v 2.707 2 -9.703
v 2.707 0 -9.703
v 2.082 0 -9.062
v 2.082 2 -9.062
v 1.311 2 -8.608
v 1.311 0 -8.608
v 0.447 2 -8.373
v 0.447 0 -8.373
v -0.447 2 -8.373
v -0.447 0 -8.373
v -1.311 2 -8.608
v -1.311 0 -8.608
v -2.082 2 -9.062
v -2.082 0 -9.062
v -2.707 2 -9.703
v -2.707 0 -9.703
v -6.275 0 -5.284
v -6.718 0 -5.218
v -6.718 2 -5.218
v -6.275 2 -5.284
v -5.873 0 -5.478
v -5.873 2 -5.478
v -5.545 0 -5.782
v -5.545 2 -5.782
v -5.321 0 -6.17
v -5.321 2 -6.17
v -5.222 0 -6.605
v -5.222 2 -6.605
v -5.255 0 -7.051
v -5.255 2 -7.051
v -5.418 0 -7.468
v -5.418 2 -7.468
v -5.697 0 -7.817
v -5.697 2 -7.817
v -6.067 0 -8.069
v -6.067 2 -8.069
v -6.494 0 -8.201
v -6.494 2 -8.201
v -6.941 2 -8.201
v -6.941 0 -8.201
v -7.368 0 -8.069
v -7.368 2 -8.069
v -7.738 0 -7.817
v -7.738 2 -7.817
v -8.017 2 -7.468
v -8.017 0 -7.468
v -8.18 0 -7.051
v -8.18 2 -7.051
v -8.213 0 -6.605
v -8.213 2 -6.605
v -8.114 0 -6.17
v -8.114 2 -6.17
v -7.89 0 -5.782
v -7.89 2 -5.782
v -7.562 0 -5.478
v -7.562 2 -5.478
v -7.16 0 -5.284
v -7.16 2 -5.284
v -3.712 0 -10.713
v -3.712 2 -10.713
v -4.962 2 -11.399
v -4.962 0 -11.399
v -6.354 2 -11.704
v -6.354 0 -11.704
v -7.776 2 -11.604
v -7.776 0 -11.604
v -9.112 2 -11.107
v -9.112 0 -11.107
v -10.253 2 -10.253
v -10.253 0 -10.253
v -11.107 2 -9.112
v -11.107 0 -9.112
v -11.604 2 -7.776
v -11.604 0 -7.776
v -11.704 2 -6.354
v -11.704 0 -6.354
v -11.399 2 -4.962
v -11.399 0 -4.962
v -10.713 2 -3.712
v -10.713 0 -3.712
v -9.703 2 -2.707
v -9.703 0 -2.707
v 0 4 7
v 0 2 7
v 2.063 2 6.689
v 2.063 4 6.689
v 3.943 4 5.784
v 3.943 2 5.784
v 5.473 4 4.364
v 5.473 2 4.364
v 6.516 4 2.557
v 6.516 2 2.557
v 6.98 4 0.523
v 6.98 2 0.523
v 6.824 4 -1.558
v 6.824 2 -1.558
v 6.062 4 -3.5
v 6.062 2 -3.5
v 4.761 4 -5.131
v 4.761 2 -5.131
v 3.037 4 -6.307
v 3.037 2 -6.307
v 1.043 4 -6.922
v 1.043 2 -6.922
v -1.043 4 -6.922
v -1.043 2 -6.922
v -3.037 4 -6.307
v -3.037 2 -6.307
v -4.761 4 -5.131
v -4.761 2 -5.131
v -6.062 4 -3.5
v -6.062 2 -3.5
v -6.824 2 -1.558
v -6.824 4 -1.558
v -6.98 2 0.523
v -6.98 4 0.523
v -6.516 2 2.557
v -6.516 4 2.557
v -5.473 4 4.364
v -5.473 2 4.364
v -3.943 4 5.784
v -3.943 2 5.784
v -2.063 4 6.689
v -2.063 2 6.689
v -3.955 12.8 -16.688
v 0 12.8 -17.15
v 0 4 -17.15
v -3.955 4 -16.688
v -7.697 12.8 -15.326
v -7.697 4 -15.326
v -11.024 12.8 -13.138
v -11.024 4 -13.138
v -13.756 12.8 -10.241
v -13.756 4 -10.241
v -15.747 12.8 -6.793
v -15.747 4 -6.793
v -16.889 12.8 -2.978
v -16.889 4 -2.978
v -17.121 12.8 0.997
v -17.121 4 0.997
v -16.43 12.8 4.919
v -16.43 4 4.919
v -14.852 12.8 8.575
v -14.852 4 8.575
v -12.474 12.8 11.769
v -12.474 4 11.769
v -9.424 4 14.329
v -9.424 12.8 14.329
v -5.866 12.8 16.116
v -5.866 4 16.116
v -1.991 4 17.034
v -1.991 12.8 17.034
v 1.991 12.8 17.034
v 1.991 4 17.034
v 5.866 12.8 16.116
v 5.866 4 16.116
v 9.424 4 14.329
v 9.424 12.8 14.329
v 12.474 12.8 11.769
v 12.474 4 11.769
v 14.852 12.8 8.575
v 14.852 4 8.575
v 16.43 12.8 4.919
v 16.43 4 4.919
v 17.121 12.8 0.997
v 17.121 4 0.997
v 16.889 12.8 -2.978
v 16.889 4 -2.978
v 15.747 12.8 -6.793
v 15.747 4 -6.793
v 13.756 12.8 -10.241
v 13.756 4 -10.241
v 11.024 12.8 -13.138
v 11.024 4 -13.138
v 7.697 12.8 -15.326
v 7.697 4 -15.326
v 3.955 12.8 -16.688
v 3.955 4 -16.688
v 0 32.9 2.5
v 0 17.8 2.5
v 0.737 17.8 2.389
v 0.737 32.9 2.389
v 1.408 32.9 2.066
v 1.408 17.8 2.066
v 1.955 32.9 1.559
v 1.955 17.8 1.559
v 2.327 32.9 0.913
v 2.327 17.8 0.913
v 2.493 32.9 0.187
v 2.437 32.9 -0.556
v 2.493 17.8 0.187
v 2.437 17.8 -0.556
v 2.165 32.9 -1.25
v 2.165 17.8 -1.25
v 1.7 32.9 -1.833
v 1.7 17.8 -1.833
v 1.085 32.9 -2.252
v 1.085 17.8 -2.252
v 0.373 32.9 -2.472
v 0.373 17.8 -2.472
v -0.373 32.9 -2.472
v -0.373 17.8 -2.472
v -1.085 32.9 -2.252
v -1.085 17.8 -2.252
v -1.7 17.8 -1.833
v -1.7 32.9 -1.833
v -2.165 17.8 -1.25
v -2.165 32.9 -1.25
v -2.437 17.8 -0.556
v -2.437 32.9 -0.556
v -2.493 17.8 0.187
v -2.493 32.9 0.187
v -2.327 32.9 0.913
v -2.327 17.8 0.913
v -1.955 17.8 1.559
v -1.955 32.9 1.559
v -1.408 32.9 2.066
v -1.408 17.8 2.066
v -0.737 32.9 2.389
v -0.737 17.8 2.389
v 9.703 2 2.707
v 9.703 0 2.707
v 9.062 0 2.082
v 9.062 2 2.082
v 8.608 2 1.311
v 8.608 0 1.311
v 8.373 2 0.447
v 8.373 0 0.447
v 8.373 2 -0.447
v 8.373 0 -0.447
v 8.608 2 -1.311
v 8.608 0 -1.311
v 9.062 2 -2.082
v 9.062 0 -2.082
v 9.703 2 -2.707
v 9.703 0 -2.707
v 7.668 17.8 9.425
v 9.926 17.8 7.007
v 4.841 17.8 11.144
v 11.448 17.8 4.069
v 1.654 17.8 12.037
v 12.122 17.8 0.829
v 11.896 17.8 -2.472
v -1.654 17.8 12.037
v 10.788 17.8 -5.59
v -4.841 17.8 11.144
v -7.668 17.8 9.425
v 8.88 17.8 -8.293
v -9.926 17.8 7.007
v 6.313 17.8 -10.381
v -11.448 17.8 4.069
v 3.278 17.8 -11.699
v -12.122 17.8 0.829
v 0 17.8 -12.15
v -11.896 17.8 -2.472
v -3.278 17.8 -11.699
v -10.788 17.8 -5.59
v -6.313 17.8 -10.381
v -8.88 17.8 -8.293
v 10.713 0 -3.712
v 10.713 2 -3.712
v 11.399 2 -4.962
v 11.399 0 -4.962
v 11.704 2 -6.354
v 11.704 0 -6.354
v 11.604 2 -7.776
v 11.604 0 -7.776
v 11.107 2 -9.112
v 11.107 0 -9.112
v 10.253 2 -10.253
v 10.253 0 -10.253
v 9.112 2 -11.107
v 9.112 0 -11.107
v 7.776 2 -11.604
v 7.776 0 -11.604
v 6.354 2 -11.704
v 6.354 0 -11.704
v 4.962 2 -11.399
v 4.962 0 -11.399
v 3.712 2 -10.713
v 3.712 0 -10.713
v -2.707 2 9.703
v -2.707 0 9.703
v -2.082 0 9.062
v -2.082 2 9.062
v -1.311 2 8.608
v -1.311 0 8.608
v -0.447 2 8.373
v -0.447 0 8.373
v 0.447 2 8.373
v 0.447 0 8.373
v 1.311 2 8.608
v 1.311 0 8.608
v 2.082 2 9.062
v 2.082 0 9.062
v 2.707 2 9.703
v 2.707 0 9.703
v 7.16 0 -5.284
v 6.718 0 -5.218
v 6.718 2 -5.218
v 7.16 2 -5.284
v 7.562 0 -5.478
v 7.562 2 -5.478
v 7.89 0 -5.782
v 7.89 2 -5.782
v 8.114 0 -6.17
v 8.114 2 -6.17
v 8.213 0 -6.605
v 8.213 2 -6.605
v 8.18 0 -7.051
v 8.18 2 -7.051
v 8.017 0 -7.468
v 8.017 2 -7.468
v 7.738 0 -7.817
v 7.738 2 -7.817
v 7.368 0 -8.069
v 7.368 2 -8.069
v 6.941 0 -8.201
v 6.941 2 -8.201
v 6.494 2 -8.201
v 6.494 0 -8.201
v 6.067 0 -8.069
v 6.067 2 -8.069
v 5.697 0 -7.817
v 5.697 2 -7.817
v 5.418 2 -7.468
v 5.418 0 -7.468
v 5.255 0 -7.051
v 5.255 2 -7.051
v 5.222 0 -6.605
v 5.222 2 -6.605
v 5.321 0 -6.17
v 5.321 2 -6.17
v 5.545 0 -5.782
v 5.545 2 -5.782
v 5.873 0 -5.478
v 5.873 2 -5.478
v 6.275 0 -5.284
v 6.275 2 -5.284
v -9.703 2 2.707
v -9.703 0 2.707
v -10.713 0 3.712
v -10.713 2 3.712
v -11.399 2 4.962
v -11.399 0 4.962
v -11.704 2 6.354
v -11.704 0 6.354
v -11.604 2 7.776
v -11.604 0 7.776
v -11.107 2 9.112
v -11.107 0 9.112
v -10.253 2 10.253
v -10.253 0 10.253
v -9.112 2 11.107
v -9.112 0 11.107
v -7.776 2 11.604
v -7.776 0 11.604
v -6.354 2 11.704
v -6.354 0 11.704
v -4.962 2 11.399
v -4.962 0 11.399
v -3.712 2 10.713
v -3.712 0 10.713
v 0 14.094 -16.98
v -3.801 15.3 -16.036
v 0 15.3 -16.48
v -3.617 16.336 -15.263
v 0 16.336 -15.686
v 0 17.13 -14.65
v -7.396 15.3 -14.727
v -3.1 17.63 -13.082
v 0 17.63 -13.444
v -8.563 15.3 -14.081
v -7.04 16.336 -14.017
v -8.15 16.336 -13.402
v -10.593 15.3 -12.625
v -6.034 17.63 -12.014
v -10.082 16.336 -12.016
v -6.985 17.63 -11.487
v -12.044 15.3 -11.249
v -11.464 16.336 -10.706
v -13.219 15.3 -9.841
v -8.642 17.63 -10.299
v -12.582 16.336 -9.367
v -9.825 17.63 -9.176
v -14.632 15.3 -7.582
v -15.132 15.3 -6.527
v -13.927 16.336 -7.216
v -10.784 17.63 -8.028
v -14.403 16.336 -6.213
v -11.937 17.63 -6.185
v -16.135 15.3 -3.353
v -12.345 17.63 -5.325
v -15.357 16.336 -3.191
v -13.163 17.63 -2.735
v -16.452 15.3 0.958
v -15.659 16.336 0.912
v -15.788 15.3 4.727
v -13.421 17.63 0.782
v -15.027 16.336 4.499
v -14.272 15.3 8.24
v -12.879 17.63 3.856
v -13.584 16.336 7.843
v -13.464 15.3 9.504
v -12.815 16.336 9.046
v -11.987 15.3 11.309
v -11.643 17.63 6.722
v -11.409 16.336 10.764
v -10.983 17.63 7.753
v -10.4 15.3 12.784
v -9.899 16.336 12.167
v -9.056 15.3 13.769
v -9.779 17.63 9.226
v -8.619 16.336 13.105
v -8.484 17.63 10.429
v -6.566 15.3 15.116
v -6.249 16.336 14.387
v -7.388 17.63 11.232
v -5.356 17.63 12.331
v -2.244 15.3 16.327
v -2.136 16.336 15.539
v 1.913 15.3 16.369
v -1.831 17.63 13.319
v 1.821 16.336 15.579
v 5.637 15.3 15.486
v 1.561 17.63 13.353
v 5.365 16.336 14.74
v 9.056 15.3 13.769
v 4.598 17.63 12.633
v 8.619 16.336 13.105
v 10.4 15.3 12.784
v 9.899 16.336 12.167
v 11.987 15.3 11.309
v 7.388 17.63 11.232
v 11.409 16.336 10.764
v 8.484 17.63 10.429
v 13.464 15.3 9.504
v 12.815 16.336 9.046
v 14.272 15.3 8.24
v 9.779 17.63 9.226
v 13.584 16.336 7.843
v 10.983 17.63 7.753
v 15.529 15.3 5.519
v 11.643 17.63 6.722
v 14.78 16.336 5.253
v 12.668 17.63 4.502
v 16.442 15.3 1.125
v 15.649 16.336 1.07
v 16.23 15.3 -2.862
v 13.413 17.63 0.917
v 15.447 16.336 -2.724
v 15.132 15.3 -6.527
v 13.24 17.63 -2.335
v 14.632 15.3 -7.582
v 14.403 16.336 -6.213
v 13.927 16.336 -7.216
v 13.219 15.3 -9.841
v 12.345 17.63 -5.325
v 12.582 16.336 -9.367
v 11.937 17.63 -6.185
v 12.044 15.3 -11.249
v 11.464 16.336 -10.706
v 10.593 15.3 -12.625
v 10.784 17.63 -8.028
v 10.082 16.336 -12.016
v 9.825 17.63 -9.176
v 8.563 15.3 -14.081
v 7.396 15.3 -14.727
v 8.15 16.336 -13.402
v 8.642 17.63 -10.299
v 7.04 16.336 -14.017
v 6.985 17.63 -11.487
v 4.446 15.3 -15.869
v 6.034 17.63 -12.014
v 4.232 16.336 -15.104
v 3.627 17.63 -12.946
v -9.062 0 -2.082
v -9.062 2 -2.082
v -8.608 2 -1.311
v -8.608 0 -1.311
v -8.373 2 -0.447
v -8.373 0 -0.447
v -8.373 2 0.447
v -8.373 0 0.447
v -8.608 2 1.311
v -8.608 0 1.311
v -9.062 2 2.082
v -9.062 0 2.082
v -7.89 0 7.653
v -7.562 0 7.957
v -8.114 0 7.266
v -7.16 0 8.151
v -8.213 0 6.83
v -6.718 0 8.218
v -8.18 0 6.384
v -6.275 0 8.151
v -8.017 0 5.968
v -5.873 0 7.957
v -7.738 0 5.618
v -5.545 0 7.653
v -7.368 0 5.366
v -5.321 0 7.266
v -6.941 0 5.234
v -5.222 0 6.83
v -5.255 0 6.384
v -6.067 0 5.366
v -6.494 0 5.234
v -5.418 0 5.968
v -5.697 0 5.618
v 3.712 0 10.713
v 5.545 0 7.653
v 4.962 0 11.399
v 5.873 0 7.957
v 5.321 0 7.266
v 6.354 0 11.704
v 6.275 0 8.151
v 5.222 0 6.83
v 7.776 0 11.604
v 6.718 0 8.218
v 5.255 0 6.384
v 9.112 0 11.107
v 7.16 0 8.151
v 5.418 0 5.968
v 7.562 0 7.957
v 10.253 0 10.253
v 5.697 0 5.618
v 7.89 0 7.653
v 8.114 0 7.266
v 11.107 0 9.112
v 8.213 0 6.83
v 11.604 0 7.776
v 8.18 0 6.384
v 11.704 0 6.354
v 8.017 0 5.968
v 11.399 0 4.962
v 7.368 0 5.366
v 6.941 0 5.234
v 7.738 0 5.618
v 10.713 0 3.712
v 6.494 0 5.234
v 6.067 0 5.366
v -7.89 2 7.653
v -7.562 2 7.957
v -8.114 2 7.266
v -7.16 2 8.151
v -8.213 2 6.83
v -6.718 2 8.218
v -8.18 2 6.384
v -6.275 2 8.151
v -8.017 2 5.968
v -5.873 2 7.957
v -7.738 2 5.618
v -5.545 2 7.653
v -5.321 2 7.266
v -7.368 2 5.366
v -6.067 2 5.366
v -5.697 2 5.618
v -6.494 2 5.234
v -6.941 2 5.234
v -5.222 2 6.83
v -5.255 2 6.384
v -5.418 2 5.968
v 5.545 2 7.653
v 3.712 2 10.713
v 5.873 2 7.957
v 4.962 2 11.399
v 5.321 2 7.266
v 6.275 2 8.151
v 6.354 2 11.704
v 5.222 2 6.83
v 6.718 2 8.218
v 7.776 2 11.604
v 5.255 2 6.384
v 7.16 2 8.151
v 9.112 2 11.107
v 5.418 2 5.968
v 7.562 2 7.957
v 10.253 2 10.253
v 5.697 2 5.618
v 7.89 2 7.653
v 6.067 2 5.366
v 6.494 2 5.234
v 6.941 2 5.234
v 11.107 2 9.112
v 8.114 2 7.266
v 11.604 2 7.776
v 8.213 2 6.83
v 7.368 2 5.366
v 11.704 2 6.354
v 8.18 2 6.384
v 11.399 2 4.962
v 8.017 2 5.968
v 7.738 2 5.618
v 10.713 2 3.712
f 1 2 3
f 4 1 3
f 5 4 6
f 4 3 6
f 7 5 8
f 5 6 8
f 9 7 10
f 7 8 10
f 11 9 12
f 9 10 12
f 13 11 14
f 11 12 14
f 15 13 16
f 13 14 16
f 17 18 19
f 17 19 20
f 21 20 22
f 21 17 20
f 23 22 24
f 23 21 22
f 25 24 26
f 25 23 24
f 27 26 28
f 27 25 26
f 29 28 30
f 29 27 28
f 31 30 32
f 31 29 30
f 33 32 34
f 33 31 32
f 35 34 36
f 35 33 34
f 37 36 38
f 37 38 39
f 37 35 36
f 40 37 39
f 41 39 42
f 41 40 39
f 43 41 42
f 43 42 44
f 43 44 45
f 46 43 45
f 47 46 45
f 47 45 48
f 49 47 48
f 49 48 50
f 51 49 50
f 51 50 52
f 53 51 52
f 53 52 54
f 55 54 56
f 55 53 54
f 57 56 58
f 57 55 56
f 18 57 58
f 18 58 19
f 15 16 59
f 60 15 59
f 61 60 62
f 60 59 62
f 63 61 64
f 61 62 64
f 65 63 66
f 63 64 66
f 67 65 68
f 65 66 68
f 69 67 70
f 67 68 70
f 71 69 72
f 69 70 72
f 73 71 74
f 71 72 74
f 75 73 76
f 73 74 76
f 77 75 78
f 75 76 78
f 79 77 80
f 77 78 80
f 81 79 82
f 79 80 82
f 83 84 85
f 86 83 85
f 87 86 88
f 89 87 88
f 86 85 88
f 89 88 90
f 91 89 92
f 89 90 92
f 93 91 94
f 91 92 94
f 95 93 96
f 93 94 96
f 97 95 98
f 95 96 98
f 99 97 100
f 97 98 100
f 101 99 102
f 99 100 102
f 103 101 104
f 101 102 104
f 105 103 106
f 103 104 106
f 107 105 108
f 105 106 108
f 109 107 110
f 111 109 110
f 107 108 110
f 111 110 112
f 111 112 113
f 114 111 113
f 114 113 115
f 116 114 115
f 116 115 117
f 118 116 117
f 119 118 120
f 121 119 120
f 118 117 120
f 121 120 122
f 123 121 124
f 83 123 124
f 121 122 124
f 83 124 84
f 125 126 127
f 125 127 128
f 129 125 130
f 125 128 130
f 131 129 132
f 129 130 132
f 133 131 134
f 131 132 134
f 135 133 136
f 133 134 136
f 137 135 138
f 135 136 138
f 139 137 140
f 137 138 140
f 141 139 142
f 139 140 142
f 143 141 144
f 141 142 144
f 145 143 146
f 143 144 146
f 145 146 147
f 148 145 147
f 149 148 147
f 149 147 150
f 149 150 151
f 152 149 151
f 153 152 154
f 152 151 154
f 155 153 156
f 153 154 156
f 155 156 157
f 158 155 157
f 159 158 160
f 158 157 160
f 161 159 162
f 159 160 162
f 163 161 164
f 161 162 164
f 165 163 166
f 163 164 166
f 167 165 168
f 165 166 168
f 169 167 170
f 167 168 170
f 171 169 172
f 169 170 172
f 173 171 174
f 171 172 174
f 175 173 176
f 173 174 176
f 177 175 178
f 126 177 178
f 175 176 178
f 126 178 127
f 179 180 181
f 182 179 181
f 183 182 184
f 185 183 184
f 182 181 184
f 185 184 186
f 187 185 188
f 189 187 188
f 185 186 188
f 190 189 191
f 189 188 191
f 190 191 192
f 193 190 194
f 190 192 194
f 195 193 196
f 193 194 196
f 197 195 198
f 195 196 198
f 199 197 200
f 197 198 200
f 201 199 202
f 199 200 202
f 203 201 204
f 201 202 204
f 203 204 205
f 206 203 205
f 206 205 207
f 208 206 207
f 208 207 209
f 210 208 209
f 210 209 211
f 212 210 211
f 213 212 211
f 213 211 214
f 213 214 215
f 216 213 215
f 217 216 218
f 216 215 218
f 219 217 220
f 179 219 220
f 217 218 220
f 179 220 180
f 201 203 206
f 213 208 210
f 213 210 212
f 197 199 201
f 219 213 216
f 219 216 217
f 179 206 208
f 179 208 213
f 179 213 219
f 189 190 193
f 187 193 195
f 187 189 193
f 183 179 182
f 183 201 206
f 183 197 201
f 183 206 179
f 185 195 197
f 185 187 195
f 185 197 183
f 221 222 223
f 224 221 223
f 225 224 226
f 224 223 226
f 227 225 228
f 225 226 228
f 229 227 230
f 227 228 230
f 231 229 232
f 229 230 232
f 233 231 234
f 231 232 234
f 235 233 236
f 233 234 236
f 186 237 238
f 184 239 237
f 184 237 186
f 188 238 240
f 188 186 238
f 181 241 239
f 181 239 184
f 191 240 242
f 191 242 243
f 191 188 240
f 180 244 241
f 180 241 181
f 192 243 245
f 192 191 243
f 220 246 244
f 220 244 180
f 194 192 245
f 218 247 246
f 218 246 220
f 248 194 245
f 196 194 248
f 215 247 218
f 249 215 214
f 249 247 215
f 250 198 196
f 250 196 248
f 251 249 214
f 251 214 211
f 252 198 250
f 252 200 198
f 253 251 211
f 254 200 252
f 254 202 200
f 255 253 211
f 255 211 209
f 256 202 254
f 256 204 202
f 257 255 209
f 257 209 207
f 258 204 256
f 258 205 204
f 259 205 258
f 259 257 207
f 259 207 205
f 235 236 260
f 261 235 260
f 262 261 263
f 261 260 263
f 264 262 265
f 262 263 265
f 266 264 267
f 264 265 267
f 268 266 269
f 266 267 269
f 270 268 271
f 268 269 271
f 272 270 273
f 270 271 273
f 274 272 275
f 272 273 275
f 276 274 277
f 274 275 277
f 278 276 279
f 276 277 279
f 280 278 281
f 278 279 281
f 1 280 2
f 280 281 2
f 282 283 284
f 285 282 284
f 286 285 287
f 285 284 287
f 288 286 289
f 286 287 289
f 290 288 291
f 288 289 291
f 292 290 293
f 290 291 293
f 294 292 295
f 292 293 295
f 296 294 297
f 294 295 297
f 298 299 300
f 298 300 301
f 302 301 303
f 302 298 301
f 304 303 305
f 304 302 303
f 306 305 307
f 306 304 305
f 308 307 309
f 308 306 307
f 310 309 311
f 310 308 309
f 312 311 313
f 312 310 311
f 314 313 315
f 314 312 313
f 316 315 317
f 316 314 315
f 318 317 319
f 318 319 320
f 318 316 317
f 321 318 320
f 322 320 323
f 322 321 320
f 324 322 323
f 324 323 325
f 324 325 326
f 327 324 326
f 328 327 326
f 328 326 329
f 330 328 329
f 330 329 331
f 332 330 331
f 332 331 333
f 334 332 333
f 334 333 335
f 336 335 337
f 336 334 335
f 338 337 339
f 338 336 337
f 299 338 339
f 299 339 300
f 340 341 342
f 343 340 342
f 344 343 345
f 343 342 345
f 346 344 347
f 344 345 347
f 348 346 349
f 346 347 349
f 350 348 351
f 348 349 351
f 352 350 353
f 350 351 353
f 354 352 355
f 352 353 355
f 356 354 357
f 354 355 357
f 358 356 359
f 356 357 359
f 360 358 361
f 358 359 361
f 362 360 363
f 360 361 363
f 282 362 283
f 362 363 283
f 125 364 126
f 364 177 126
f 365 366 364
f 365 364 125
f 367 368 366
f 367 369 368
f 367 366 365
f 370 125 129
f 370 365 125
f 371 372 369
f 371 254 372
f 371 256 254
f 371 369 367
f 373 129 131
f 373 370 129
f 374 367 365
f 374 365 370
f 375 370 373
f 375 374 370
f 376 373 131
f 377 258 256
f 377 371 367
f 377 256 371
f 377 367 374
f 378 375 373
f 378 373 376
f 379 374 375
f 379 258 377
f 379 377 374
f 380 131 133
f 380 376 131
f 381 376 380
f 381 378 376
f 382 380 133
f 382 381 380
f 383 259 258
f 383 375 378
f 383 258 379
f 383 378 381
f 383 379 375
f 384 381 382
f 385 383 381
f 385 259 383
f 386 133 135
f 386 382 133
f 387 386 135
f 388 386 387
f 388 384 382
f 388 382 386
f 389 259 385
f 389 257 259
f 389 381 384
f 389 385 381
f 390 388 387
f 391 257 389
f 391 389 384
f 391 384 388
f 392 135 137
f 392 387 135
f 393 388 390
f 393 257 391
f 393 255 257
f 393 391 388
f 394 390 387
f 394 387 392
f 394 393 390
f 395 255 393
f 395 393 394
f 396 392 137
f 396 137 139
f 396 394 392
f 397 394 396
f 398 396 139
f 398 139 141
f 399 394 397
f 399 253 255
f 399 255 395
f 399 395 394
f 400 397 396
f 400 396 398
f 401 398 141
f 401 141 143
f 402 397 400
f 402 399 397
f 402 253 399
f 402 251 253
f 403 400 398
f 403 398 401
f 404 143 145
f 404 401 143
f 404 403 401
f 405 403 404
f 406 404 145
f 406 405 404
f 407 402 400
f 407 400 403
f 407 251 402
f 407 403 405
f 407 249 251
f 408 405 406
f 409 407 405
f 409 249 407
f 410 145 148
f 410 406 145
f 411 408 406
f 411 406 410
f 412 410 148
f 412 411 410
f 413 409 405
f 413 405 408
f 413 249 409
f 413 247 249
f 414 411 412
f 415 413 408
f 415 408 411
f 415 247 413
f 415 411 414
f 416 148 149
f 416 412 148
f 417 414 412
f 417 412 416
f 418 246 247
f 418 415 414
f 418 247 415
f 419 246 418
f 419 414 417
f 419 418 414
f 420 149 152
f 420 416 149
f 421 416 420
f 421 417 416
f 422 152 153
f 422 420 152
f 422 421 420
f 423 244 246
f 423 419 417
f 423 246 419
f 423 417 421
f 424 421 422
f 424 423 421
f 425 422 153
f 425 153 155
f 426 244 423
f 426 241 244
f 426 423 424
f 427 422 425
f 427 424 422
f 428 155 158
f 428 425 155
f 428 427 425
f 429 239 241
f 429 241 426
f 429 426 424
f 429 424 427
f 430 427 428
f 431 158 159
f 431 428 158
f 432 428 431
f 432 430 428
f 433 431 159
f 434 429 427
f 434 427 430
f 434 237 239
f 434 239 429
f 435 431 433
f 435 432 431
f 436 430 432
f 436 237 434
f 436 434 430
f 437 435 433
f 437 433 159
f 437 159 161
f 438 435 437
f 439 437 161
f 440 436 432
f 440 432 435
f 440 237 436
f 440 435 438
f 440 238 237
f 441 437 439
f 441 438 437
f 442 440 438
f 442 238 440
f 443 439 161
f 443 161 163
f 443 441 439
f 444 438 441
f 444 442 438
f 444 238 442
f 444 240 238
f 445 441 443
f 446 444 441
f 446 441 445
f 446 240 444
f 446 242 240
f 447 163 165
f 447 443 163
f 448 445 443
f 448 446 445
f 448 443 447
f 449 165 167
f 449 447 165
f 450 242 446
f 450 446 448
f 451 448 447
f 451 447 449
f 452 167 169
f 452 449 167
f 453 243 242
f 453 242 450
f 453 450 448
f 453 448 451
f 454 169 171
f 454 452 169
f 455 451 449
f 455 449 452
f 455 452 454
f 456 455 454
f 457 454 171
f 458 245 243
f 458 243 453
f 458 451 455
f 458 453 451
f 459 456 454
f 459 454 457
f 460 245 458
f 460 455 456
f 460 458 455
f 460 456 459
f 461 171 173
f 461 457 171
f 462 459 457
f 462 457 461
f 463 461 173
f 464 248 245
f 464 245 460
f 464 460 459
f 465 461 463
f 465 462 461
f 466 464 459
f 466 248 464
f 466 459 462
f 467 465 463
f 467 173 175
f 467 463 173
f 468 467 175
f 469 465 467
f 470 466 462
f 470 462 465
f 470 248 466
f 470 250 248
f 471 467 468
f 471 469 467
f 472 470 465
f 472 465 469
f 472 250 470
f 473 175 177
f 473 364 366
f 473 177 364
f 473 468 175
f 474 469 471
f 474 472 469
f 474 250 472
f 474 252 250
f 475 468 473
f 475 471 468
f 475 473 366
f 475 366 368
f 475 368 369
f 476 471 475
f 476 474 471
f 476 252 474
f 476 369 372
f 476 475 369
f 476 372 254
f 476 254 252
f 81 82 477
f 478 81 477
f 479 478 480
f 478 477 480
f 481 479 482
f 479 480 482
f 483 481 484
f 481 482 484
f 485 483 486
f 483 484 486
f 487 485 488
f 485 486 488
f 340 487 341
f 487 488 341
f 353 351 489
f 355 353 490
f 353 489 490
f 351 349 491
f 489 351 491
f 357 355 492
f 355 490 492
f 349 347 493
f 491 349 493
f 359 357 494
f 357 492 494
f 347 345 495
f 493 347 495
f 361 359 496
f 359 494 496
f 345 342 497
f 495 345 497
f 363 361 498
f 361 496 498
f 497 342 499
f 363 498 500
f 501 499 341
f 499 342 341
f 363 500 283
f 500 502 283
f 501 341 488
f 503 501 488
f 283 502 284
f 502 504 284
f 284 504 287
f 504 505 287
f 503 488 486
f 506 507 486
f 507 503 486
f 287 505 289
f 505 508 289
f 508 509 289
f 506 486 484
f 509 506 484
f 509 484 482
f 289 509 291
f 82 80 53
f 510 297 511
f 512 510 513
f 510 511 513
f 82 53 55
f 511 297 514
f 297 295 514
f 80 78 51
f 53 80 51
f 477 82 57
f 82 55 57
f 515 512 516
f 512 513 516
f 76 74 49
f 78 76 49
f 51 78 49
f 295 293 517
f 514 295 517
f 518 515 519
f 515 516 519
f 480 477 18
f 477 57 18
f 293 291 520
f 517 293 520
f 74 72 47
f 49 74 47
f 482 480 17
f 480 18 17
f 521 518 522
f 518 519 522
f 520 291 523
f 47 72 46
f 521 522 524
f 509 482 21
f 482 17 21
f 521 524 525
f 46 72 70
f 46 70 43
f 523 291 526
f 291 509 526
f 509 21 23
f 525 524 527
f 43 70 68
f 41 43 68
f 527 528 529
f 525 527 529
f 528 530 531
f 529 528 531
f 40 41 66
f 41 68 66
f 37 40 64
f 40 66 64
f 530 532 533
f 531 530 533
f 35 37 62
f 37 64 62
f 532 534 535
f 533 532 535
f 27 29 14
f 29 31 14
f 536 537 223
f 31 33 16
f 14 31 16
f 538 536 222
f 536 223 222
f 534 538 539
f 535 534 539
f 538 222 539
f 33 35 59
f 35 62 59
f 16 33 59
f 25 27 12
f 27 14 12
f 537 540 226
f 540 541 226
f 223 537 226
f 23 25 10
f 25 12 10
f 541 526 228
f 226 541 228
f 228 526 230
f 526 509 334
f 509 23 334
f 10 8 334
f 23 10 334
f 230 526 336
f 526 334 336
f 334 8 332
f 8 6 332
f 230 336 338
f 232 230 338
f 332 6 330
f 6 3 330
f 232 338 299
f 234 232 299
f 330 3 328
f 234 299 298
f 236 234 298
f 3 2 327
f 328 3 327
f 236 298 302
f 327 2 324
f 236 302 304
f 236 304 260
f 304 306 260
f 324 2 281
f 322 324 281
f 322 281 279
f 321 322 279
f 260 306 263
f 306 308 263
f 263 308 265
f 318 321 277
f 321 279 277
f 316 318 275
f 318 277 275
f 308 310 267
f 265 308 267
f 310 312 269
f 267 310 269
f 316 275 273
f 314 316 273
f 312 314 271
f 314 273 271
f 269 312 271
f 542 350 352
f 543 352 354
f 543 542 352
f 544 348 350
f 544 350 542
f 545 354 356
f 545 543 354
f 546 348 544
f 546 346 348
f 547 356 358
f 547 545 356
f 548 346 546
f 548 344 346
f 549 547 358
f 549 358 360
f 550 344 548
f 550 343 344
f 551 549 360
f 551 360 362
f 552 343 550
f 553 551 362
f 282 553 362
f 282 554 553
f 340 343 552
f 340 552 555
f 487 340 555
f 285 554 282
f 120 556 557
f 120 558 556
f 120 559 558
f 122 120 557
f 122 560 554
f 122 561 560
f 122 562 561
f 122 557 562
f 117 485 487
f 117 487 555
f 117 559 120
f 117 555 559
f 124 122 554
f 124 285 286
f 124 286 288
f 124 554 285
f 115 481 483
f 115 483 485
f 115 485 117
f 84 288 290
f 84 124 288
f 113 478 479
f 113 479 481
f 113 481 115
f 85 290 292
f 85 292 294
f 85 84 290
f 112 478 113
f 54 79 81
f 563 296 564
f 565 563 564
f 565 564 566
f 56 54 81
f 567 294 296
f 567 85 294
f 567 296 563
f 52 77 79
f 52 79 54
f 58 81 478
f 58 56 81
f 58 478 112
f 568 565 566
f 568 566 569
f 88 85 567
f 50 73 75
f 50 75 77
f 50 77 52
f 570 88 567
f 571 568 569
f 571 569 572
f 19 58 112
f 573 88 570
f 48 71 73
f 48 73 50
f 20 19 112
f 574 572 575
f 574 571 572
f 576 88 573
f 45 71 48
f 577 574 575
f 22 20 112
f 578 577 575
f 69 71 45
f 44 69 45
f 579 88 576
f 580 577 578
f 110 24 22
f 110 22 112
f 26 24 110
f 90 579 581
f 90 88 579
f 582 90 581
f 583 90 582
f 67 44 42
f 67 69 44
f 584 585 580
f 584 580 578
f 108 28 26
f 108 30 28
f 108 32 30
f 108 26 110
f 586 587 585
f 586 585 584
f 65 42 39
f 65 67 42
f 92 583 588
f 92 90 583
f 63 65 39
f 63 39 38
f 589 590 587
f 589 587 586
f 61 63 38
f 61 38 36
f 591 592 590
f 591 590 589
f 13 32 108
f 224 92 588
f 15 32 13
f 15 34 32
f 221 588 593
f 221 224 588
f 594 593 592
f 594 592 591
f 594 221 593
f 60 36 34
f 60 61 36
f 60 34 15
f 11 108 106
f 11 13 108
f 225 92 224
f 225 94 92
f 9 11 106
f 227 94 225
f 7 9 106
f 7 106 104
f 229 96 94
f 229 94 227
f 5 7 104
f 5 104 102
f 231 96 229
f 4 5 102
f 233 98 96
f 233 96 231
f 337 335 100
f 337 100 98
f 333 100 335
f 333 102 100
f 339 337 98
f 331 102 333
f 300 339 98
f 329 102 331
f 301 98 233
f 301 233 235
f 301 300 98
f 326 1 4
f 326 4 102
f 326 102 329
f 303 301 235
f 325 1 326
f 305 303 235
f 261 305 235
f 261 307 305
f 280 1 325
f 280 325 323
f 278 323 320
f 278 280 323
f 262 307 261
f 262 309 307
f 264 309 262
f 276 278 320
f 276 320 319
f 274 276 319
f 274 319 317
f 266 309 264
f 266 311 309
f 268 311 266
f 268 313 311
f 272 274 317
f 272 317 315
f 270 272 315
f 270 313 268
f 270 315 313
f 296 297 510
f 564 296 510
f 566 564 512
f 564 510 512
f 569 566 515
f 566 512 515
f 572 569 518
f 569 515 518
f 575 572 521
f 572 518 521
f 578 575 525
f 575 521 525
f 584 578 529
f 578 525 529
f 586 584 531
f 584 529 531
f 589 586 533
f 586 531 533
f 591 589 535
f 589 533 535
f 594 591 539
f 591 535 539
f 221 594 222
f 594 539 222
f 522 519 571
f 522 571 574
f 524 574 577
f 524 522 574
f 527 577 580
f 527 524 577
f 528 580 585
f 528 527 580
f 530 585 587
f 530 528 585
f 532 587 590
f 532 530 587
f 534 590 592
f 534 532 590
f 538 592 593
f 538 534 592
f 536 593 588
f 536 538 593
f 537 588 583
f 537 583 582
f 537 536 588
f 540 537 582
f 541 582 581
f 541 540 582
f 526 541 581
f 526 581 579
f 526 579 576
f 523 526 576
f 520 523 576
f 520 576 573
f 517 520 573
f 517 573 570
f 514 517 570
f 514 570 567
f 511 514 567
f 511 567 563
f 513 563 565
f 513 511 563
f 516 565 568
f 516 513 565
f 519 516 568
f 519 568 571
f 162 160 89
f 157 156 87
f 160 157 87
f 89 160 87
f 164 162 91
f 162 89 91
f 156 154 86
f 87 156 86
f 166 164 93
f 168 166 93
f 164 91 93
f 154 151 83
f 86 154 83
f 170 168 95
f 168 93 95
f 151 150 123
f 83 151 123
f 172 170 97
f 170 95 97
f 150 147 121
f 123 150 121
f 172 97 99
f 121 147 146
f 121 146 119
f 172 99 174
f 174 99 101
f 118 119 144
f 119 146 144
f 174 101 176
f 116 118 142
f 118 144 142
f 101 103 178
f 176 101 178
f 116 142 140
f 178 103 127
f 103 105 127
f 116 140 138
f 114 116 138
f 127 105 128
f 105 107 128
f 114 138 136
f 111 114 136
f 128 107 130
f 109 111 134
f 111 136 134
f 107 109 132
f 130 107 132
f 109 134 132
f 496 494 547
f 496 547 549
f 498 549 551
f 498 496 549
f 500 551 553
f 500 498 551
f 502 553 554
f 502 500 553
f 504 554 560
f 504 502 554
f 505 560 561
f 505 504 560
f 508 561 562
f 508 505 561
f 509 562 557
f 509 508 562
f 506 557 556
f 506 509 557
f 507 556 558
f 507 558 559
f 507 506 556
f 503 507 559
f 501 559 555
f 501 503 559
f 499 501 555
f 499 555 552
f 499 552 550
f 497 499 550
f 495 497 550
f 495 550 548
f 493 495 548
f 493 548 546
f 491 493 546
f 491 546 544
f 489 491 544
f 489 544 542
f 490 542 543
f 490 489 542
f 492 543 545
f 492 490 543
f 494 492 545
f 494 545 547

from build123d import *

# Parameters (mm, degrees)
SKETCH_1_R      = 1.5
EXTRUDE_1_DEPTH = 2
SKETCH_2_R      = 7
EXTRUDE_2_DEPTH = 2
SKETCH_3_R      = 17.15
EXTRUDE_3_DEPTH = 13.8
FILLET_1_R      = 5
SKETCH_4_R      = 2.5
EXTRUDE_4_DEPTH = 15.1


with BuildPart() as part:
    # 草图1 → 凸台-拉伸1 (new body)
    with BuildSketch(Plane(origin=(0, 0, 0), x_dir=(1, 0, 0), z_dir=(0, 1, 0))):
        with BuildLine():
            ThreePointArc((-2.706611278, 9.702921591), (-10.253048327, 10.253048327), (-9.702921591, 2.706611278))
            ThreePointArc((-9.702921591, 2.706611278), (-8.343447309, 0), (-9.702921591, -2.706611278))
            ThreePointArc((-9.702921591, -2.706611278), (-10.253048327, -10.253048327), (-2.706611278, -9.702921591))
            ThreePointArc((-2.706611278, -9.702921591), (0, -8.343447309), (2.706611278, -9.702921591))
            ThreePointArc((2.706611278, -9.702921591), (10.253048327, -10.253048327), (9.702921591, -2.706611278))
            ThreePointArc((9.702921591, -2.706611278), (8.343447309, 0), (9.702921591, 2.706611278))
            ThreePointArc((9.702921591, 2.706611278), (10.253048327, 10.253048327), (2.706611278, 9.702921591))
            ThreePointArc((2.706611278, 9.702921591), (0, 8.343447309), (-2.706611278, 9.702921591))
        make_face()
        with Locations(Location((-6.717514421, 6.717514421, 0), (0, 0, 270))):
            Circle(SKETCH_1_R, mode=Mode.SUBTRACT)
        with Locations(Location((6.717514421, 6.717514421, 0), (0, 0, 270))):
            Circle(SKETCH_1_R, mode=Mode.SUBTRACT)
        with Locations(Location((6.717514421, -6.717514421, 0), (0, 0, 270))):
            Circle(SKETCH_1_R, mode=Mode.SUBTRACT)
        with Locations(Location((-6.717514421, -6.717514421, 0), (0, 0, 270))):
            Circle(SKETCH_1_R, mode=Mode.SUBTRACT)
    extrude(amount=EXTRUDE_1_DEPTH)

    # 草图2 → 凸台-拉伸2 (add)
    with BuildSketch(Plane(origin=(0, 2, 0), x_dir=(1, 0, 0), z_dir=(0, 1, 0))):
        with Locations(Location((0, 0, 0), (0, 0, 270))):
            Circle(SKETCH_2_R)
    extrude(amount=EXTRUDE_2_DEPTH)

    # 草图3 → 凸台-拉伸3 (add)
    with BuildSketch(Plane(origin=(0, 4, 0), x_dir=(1, 0, 0), z_dir=(0, 1, 0))):
        with Locations(Location((0, 0, 0), (0, 0, 90))):
            Circle(SKETCH_3_R)
    extrude(amount=EXTRUDE_3_DEPTH)

    # 圆角1
    fillet_1_edges = [part.edges().sort_by_distance(p)[0] for p in [
        (0, 17.8, 17.15),
    ]]
    fillet(fillet_1_edges, radius=FILLET_1_R)

    # 草图4 → 凸台-拉伸4 (add)
    with BuildSketch(Plane(origin=(0, 17.8, 0), x_dir=(1, 0, 0), z_dir=(0, 1, 0))):
        with Locations(Location((0, 0, 0), (0, 0, 270))):
            Circle(SKETCH_4_R)
    extrude(amount=EXTRUDE_4_DEPTH)


solid = part.part
